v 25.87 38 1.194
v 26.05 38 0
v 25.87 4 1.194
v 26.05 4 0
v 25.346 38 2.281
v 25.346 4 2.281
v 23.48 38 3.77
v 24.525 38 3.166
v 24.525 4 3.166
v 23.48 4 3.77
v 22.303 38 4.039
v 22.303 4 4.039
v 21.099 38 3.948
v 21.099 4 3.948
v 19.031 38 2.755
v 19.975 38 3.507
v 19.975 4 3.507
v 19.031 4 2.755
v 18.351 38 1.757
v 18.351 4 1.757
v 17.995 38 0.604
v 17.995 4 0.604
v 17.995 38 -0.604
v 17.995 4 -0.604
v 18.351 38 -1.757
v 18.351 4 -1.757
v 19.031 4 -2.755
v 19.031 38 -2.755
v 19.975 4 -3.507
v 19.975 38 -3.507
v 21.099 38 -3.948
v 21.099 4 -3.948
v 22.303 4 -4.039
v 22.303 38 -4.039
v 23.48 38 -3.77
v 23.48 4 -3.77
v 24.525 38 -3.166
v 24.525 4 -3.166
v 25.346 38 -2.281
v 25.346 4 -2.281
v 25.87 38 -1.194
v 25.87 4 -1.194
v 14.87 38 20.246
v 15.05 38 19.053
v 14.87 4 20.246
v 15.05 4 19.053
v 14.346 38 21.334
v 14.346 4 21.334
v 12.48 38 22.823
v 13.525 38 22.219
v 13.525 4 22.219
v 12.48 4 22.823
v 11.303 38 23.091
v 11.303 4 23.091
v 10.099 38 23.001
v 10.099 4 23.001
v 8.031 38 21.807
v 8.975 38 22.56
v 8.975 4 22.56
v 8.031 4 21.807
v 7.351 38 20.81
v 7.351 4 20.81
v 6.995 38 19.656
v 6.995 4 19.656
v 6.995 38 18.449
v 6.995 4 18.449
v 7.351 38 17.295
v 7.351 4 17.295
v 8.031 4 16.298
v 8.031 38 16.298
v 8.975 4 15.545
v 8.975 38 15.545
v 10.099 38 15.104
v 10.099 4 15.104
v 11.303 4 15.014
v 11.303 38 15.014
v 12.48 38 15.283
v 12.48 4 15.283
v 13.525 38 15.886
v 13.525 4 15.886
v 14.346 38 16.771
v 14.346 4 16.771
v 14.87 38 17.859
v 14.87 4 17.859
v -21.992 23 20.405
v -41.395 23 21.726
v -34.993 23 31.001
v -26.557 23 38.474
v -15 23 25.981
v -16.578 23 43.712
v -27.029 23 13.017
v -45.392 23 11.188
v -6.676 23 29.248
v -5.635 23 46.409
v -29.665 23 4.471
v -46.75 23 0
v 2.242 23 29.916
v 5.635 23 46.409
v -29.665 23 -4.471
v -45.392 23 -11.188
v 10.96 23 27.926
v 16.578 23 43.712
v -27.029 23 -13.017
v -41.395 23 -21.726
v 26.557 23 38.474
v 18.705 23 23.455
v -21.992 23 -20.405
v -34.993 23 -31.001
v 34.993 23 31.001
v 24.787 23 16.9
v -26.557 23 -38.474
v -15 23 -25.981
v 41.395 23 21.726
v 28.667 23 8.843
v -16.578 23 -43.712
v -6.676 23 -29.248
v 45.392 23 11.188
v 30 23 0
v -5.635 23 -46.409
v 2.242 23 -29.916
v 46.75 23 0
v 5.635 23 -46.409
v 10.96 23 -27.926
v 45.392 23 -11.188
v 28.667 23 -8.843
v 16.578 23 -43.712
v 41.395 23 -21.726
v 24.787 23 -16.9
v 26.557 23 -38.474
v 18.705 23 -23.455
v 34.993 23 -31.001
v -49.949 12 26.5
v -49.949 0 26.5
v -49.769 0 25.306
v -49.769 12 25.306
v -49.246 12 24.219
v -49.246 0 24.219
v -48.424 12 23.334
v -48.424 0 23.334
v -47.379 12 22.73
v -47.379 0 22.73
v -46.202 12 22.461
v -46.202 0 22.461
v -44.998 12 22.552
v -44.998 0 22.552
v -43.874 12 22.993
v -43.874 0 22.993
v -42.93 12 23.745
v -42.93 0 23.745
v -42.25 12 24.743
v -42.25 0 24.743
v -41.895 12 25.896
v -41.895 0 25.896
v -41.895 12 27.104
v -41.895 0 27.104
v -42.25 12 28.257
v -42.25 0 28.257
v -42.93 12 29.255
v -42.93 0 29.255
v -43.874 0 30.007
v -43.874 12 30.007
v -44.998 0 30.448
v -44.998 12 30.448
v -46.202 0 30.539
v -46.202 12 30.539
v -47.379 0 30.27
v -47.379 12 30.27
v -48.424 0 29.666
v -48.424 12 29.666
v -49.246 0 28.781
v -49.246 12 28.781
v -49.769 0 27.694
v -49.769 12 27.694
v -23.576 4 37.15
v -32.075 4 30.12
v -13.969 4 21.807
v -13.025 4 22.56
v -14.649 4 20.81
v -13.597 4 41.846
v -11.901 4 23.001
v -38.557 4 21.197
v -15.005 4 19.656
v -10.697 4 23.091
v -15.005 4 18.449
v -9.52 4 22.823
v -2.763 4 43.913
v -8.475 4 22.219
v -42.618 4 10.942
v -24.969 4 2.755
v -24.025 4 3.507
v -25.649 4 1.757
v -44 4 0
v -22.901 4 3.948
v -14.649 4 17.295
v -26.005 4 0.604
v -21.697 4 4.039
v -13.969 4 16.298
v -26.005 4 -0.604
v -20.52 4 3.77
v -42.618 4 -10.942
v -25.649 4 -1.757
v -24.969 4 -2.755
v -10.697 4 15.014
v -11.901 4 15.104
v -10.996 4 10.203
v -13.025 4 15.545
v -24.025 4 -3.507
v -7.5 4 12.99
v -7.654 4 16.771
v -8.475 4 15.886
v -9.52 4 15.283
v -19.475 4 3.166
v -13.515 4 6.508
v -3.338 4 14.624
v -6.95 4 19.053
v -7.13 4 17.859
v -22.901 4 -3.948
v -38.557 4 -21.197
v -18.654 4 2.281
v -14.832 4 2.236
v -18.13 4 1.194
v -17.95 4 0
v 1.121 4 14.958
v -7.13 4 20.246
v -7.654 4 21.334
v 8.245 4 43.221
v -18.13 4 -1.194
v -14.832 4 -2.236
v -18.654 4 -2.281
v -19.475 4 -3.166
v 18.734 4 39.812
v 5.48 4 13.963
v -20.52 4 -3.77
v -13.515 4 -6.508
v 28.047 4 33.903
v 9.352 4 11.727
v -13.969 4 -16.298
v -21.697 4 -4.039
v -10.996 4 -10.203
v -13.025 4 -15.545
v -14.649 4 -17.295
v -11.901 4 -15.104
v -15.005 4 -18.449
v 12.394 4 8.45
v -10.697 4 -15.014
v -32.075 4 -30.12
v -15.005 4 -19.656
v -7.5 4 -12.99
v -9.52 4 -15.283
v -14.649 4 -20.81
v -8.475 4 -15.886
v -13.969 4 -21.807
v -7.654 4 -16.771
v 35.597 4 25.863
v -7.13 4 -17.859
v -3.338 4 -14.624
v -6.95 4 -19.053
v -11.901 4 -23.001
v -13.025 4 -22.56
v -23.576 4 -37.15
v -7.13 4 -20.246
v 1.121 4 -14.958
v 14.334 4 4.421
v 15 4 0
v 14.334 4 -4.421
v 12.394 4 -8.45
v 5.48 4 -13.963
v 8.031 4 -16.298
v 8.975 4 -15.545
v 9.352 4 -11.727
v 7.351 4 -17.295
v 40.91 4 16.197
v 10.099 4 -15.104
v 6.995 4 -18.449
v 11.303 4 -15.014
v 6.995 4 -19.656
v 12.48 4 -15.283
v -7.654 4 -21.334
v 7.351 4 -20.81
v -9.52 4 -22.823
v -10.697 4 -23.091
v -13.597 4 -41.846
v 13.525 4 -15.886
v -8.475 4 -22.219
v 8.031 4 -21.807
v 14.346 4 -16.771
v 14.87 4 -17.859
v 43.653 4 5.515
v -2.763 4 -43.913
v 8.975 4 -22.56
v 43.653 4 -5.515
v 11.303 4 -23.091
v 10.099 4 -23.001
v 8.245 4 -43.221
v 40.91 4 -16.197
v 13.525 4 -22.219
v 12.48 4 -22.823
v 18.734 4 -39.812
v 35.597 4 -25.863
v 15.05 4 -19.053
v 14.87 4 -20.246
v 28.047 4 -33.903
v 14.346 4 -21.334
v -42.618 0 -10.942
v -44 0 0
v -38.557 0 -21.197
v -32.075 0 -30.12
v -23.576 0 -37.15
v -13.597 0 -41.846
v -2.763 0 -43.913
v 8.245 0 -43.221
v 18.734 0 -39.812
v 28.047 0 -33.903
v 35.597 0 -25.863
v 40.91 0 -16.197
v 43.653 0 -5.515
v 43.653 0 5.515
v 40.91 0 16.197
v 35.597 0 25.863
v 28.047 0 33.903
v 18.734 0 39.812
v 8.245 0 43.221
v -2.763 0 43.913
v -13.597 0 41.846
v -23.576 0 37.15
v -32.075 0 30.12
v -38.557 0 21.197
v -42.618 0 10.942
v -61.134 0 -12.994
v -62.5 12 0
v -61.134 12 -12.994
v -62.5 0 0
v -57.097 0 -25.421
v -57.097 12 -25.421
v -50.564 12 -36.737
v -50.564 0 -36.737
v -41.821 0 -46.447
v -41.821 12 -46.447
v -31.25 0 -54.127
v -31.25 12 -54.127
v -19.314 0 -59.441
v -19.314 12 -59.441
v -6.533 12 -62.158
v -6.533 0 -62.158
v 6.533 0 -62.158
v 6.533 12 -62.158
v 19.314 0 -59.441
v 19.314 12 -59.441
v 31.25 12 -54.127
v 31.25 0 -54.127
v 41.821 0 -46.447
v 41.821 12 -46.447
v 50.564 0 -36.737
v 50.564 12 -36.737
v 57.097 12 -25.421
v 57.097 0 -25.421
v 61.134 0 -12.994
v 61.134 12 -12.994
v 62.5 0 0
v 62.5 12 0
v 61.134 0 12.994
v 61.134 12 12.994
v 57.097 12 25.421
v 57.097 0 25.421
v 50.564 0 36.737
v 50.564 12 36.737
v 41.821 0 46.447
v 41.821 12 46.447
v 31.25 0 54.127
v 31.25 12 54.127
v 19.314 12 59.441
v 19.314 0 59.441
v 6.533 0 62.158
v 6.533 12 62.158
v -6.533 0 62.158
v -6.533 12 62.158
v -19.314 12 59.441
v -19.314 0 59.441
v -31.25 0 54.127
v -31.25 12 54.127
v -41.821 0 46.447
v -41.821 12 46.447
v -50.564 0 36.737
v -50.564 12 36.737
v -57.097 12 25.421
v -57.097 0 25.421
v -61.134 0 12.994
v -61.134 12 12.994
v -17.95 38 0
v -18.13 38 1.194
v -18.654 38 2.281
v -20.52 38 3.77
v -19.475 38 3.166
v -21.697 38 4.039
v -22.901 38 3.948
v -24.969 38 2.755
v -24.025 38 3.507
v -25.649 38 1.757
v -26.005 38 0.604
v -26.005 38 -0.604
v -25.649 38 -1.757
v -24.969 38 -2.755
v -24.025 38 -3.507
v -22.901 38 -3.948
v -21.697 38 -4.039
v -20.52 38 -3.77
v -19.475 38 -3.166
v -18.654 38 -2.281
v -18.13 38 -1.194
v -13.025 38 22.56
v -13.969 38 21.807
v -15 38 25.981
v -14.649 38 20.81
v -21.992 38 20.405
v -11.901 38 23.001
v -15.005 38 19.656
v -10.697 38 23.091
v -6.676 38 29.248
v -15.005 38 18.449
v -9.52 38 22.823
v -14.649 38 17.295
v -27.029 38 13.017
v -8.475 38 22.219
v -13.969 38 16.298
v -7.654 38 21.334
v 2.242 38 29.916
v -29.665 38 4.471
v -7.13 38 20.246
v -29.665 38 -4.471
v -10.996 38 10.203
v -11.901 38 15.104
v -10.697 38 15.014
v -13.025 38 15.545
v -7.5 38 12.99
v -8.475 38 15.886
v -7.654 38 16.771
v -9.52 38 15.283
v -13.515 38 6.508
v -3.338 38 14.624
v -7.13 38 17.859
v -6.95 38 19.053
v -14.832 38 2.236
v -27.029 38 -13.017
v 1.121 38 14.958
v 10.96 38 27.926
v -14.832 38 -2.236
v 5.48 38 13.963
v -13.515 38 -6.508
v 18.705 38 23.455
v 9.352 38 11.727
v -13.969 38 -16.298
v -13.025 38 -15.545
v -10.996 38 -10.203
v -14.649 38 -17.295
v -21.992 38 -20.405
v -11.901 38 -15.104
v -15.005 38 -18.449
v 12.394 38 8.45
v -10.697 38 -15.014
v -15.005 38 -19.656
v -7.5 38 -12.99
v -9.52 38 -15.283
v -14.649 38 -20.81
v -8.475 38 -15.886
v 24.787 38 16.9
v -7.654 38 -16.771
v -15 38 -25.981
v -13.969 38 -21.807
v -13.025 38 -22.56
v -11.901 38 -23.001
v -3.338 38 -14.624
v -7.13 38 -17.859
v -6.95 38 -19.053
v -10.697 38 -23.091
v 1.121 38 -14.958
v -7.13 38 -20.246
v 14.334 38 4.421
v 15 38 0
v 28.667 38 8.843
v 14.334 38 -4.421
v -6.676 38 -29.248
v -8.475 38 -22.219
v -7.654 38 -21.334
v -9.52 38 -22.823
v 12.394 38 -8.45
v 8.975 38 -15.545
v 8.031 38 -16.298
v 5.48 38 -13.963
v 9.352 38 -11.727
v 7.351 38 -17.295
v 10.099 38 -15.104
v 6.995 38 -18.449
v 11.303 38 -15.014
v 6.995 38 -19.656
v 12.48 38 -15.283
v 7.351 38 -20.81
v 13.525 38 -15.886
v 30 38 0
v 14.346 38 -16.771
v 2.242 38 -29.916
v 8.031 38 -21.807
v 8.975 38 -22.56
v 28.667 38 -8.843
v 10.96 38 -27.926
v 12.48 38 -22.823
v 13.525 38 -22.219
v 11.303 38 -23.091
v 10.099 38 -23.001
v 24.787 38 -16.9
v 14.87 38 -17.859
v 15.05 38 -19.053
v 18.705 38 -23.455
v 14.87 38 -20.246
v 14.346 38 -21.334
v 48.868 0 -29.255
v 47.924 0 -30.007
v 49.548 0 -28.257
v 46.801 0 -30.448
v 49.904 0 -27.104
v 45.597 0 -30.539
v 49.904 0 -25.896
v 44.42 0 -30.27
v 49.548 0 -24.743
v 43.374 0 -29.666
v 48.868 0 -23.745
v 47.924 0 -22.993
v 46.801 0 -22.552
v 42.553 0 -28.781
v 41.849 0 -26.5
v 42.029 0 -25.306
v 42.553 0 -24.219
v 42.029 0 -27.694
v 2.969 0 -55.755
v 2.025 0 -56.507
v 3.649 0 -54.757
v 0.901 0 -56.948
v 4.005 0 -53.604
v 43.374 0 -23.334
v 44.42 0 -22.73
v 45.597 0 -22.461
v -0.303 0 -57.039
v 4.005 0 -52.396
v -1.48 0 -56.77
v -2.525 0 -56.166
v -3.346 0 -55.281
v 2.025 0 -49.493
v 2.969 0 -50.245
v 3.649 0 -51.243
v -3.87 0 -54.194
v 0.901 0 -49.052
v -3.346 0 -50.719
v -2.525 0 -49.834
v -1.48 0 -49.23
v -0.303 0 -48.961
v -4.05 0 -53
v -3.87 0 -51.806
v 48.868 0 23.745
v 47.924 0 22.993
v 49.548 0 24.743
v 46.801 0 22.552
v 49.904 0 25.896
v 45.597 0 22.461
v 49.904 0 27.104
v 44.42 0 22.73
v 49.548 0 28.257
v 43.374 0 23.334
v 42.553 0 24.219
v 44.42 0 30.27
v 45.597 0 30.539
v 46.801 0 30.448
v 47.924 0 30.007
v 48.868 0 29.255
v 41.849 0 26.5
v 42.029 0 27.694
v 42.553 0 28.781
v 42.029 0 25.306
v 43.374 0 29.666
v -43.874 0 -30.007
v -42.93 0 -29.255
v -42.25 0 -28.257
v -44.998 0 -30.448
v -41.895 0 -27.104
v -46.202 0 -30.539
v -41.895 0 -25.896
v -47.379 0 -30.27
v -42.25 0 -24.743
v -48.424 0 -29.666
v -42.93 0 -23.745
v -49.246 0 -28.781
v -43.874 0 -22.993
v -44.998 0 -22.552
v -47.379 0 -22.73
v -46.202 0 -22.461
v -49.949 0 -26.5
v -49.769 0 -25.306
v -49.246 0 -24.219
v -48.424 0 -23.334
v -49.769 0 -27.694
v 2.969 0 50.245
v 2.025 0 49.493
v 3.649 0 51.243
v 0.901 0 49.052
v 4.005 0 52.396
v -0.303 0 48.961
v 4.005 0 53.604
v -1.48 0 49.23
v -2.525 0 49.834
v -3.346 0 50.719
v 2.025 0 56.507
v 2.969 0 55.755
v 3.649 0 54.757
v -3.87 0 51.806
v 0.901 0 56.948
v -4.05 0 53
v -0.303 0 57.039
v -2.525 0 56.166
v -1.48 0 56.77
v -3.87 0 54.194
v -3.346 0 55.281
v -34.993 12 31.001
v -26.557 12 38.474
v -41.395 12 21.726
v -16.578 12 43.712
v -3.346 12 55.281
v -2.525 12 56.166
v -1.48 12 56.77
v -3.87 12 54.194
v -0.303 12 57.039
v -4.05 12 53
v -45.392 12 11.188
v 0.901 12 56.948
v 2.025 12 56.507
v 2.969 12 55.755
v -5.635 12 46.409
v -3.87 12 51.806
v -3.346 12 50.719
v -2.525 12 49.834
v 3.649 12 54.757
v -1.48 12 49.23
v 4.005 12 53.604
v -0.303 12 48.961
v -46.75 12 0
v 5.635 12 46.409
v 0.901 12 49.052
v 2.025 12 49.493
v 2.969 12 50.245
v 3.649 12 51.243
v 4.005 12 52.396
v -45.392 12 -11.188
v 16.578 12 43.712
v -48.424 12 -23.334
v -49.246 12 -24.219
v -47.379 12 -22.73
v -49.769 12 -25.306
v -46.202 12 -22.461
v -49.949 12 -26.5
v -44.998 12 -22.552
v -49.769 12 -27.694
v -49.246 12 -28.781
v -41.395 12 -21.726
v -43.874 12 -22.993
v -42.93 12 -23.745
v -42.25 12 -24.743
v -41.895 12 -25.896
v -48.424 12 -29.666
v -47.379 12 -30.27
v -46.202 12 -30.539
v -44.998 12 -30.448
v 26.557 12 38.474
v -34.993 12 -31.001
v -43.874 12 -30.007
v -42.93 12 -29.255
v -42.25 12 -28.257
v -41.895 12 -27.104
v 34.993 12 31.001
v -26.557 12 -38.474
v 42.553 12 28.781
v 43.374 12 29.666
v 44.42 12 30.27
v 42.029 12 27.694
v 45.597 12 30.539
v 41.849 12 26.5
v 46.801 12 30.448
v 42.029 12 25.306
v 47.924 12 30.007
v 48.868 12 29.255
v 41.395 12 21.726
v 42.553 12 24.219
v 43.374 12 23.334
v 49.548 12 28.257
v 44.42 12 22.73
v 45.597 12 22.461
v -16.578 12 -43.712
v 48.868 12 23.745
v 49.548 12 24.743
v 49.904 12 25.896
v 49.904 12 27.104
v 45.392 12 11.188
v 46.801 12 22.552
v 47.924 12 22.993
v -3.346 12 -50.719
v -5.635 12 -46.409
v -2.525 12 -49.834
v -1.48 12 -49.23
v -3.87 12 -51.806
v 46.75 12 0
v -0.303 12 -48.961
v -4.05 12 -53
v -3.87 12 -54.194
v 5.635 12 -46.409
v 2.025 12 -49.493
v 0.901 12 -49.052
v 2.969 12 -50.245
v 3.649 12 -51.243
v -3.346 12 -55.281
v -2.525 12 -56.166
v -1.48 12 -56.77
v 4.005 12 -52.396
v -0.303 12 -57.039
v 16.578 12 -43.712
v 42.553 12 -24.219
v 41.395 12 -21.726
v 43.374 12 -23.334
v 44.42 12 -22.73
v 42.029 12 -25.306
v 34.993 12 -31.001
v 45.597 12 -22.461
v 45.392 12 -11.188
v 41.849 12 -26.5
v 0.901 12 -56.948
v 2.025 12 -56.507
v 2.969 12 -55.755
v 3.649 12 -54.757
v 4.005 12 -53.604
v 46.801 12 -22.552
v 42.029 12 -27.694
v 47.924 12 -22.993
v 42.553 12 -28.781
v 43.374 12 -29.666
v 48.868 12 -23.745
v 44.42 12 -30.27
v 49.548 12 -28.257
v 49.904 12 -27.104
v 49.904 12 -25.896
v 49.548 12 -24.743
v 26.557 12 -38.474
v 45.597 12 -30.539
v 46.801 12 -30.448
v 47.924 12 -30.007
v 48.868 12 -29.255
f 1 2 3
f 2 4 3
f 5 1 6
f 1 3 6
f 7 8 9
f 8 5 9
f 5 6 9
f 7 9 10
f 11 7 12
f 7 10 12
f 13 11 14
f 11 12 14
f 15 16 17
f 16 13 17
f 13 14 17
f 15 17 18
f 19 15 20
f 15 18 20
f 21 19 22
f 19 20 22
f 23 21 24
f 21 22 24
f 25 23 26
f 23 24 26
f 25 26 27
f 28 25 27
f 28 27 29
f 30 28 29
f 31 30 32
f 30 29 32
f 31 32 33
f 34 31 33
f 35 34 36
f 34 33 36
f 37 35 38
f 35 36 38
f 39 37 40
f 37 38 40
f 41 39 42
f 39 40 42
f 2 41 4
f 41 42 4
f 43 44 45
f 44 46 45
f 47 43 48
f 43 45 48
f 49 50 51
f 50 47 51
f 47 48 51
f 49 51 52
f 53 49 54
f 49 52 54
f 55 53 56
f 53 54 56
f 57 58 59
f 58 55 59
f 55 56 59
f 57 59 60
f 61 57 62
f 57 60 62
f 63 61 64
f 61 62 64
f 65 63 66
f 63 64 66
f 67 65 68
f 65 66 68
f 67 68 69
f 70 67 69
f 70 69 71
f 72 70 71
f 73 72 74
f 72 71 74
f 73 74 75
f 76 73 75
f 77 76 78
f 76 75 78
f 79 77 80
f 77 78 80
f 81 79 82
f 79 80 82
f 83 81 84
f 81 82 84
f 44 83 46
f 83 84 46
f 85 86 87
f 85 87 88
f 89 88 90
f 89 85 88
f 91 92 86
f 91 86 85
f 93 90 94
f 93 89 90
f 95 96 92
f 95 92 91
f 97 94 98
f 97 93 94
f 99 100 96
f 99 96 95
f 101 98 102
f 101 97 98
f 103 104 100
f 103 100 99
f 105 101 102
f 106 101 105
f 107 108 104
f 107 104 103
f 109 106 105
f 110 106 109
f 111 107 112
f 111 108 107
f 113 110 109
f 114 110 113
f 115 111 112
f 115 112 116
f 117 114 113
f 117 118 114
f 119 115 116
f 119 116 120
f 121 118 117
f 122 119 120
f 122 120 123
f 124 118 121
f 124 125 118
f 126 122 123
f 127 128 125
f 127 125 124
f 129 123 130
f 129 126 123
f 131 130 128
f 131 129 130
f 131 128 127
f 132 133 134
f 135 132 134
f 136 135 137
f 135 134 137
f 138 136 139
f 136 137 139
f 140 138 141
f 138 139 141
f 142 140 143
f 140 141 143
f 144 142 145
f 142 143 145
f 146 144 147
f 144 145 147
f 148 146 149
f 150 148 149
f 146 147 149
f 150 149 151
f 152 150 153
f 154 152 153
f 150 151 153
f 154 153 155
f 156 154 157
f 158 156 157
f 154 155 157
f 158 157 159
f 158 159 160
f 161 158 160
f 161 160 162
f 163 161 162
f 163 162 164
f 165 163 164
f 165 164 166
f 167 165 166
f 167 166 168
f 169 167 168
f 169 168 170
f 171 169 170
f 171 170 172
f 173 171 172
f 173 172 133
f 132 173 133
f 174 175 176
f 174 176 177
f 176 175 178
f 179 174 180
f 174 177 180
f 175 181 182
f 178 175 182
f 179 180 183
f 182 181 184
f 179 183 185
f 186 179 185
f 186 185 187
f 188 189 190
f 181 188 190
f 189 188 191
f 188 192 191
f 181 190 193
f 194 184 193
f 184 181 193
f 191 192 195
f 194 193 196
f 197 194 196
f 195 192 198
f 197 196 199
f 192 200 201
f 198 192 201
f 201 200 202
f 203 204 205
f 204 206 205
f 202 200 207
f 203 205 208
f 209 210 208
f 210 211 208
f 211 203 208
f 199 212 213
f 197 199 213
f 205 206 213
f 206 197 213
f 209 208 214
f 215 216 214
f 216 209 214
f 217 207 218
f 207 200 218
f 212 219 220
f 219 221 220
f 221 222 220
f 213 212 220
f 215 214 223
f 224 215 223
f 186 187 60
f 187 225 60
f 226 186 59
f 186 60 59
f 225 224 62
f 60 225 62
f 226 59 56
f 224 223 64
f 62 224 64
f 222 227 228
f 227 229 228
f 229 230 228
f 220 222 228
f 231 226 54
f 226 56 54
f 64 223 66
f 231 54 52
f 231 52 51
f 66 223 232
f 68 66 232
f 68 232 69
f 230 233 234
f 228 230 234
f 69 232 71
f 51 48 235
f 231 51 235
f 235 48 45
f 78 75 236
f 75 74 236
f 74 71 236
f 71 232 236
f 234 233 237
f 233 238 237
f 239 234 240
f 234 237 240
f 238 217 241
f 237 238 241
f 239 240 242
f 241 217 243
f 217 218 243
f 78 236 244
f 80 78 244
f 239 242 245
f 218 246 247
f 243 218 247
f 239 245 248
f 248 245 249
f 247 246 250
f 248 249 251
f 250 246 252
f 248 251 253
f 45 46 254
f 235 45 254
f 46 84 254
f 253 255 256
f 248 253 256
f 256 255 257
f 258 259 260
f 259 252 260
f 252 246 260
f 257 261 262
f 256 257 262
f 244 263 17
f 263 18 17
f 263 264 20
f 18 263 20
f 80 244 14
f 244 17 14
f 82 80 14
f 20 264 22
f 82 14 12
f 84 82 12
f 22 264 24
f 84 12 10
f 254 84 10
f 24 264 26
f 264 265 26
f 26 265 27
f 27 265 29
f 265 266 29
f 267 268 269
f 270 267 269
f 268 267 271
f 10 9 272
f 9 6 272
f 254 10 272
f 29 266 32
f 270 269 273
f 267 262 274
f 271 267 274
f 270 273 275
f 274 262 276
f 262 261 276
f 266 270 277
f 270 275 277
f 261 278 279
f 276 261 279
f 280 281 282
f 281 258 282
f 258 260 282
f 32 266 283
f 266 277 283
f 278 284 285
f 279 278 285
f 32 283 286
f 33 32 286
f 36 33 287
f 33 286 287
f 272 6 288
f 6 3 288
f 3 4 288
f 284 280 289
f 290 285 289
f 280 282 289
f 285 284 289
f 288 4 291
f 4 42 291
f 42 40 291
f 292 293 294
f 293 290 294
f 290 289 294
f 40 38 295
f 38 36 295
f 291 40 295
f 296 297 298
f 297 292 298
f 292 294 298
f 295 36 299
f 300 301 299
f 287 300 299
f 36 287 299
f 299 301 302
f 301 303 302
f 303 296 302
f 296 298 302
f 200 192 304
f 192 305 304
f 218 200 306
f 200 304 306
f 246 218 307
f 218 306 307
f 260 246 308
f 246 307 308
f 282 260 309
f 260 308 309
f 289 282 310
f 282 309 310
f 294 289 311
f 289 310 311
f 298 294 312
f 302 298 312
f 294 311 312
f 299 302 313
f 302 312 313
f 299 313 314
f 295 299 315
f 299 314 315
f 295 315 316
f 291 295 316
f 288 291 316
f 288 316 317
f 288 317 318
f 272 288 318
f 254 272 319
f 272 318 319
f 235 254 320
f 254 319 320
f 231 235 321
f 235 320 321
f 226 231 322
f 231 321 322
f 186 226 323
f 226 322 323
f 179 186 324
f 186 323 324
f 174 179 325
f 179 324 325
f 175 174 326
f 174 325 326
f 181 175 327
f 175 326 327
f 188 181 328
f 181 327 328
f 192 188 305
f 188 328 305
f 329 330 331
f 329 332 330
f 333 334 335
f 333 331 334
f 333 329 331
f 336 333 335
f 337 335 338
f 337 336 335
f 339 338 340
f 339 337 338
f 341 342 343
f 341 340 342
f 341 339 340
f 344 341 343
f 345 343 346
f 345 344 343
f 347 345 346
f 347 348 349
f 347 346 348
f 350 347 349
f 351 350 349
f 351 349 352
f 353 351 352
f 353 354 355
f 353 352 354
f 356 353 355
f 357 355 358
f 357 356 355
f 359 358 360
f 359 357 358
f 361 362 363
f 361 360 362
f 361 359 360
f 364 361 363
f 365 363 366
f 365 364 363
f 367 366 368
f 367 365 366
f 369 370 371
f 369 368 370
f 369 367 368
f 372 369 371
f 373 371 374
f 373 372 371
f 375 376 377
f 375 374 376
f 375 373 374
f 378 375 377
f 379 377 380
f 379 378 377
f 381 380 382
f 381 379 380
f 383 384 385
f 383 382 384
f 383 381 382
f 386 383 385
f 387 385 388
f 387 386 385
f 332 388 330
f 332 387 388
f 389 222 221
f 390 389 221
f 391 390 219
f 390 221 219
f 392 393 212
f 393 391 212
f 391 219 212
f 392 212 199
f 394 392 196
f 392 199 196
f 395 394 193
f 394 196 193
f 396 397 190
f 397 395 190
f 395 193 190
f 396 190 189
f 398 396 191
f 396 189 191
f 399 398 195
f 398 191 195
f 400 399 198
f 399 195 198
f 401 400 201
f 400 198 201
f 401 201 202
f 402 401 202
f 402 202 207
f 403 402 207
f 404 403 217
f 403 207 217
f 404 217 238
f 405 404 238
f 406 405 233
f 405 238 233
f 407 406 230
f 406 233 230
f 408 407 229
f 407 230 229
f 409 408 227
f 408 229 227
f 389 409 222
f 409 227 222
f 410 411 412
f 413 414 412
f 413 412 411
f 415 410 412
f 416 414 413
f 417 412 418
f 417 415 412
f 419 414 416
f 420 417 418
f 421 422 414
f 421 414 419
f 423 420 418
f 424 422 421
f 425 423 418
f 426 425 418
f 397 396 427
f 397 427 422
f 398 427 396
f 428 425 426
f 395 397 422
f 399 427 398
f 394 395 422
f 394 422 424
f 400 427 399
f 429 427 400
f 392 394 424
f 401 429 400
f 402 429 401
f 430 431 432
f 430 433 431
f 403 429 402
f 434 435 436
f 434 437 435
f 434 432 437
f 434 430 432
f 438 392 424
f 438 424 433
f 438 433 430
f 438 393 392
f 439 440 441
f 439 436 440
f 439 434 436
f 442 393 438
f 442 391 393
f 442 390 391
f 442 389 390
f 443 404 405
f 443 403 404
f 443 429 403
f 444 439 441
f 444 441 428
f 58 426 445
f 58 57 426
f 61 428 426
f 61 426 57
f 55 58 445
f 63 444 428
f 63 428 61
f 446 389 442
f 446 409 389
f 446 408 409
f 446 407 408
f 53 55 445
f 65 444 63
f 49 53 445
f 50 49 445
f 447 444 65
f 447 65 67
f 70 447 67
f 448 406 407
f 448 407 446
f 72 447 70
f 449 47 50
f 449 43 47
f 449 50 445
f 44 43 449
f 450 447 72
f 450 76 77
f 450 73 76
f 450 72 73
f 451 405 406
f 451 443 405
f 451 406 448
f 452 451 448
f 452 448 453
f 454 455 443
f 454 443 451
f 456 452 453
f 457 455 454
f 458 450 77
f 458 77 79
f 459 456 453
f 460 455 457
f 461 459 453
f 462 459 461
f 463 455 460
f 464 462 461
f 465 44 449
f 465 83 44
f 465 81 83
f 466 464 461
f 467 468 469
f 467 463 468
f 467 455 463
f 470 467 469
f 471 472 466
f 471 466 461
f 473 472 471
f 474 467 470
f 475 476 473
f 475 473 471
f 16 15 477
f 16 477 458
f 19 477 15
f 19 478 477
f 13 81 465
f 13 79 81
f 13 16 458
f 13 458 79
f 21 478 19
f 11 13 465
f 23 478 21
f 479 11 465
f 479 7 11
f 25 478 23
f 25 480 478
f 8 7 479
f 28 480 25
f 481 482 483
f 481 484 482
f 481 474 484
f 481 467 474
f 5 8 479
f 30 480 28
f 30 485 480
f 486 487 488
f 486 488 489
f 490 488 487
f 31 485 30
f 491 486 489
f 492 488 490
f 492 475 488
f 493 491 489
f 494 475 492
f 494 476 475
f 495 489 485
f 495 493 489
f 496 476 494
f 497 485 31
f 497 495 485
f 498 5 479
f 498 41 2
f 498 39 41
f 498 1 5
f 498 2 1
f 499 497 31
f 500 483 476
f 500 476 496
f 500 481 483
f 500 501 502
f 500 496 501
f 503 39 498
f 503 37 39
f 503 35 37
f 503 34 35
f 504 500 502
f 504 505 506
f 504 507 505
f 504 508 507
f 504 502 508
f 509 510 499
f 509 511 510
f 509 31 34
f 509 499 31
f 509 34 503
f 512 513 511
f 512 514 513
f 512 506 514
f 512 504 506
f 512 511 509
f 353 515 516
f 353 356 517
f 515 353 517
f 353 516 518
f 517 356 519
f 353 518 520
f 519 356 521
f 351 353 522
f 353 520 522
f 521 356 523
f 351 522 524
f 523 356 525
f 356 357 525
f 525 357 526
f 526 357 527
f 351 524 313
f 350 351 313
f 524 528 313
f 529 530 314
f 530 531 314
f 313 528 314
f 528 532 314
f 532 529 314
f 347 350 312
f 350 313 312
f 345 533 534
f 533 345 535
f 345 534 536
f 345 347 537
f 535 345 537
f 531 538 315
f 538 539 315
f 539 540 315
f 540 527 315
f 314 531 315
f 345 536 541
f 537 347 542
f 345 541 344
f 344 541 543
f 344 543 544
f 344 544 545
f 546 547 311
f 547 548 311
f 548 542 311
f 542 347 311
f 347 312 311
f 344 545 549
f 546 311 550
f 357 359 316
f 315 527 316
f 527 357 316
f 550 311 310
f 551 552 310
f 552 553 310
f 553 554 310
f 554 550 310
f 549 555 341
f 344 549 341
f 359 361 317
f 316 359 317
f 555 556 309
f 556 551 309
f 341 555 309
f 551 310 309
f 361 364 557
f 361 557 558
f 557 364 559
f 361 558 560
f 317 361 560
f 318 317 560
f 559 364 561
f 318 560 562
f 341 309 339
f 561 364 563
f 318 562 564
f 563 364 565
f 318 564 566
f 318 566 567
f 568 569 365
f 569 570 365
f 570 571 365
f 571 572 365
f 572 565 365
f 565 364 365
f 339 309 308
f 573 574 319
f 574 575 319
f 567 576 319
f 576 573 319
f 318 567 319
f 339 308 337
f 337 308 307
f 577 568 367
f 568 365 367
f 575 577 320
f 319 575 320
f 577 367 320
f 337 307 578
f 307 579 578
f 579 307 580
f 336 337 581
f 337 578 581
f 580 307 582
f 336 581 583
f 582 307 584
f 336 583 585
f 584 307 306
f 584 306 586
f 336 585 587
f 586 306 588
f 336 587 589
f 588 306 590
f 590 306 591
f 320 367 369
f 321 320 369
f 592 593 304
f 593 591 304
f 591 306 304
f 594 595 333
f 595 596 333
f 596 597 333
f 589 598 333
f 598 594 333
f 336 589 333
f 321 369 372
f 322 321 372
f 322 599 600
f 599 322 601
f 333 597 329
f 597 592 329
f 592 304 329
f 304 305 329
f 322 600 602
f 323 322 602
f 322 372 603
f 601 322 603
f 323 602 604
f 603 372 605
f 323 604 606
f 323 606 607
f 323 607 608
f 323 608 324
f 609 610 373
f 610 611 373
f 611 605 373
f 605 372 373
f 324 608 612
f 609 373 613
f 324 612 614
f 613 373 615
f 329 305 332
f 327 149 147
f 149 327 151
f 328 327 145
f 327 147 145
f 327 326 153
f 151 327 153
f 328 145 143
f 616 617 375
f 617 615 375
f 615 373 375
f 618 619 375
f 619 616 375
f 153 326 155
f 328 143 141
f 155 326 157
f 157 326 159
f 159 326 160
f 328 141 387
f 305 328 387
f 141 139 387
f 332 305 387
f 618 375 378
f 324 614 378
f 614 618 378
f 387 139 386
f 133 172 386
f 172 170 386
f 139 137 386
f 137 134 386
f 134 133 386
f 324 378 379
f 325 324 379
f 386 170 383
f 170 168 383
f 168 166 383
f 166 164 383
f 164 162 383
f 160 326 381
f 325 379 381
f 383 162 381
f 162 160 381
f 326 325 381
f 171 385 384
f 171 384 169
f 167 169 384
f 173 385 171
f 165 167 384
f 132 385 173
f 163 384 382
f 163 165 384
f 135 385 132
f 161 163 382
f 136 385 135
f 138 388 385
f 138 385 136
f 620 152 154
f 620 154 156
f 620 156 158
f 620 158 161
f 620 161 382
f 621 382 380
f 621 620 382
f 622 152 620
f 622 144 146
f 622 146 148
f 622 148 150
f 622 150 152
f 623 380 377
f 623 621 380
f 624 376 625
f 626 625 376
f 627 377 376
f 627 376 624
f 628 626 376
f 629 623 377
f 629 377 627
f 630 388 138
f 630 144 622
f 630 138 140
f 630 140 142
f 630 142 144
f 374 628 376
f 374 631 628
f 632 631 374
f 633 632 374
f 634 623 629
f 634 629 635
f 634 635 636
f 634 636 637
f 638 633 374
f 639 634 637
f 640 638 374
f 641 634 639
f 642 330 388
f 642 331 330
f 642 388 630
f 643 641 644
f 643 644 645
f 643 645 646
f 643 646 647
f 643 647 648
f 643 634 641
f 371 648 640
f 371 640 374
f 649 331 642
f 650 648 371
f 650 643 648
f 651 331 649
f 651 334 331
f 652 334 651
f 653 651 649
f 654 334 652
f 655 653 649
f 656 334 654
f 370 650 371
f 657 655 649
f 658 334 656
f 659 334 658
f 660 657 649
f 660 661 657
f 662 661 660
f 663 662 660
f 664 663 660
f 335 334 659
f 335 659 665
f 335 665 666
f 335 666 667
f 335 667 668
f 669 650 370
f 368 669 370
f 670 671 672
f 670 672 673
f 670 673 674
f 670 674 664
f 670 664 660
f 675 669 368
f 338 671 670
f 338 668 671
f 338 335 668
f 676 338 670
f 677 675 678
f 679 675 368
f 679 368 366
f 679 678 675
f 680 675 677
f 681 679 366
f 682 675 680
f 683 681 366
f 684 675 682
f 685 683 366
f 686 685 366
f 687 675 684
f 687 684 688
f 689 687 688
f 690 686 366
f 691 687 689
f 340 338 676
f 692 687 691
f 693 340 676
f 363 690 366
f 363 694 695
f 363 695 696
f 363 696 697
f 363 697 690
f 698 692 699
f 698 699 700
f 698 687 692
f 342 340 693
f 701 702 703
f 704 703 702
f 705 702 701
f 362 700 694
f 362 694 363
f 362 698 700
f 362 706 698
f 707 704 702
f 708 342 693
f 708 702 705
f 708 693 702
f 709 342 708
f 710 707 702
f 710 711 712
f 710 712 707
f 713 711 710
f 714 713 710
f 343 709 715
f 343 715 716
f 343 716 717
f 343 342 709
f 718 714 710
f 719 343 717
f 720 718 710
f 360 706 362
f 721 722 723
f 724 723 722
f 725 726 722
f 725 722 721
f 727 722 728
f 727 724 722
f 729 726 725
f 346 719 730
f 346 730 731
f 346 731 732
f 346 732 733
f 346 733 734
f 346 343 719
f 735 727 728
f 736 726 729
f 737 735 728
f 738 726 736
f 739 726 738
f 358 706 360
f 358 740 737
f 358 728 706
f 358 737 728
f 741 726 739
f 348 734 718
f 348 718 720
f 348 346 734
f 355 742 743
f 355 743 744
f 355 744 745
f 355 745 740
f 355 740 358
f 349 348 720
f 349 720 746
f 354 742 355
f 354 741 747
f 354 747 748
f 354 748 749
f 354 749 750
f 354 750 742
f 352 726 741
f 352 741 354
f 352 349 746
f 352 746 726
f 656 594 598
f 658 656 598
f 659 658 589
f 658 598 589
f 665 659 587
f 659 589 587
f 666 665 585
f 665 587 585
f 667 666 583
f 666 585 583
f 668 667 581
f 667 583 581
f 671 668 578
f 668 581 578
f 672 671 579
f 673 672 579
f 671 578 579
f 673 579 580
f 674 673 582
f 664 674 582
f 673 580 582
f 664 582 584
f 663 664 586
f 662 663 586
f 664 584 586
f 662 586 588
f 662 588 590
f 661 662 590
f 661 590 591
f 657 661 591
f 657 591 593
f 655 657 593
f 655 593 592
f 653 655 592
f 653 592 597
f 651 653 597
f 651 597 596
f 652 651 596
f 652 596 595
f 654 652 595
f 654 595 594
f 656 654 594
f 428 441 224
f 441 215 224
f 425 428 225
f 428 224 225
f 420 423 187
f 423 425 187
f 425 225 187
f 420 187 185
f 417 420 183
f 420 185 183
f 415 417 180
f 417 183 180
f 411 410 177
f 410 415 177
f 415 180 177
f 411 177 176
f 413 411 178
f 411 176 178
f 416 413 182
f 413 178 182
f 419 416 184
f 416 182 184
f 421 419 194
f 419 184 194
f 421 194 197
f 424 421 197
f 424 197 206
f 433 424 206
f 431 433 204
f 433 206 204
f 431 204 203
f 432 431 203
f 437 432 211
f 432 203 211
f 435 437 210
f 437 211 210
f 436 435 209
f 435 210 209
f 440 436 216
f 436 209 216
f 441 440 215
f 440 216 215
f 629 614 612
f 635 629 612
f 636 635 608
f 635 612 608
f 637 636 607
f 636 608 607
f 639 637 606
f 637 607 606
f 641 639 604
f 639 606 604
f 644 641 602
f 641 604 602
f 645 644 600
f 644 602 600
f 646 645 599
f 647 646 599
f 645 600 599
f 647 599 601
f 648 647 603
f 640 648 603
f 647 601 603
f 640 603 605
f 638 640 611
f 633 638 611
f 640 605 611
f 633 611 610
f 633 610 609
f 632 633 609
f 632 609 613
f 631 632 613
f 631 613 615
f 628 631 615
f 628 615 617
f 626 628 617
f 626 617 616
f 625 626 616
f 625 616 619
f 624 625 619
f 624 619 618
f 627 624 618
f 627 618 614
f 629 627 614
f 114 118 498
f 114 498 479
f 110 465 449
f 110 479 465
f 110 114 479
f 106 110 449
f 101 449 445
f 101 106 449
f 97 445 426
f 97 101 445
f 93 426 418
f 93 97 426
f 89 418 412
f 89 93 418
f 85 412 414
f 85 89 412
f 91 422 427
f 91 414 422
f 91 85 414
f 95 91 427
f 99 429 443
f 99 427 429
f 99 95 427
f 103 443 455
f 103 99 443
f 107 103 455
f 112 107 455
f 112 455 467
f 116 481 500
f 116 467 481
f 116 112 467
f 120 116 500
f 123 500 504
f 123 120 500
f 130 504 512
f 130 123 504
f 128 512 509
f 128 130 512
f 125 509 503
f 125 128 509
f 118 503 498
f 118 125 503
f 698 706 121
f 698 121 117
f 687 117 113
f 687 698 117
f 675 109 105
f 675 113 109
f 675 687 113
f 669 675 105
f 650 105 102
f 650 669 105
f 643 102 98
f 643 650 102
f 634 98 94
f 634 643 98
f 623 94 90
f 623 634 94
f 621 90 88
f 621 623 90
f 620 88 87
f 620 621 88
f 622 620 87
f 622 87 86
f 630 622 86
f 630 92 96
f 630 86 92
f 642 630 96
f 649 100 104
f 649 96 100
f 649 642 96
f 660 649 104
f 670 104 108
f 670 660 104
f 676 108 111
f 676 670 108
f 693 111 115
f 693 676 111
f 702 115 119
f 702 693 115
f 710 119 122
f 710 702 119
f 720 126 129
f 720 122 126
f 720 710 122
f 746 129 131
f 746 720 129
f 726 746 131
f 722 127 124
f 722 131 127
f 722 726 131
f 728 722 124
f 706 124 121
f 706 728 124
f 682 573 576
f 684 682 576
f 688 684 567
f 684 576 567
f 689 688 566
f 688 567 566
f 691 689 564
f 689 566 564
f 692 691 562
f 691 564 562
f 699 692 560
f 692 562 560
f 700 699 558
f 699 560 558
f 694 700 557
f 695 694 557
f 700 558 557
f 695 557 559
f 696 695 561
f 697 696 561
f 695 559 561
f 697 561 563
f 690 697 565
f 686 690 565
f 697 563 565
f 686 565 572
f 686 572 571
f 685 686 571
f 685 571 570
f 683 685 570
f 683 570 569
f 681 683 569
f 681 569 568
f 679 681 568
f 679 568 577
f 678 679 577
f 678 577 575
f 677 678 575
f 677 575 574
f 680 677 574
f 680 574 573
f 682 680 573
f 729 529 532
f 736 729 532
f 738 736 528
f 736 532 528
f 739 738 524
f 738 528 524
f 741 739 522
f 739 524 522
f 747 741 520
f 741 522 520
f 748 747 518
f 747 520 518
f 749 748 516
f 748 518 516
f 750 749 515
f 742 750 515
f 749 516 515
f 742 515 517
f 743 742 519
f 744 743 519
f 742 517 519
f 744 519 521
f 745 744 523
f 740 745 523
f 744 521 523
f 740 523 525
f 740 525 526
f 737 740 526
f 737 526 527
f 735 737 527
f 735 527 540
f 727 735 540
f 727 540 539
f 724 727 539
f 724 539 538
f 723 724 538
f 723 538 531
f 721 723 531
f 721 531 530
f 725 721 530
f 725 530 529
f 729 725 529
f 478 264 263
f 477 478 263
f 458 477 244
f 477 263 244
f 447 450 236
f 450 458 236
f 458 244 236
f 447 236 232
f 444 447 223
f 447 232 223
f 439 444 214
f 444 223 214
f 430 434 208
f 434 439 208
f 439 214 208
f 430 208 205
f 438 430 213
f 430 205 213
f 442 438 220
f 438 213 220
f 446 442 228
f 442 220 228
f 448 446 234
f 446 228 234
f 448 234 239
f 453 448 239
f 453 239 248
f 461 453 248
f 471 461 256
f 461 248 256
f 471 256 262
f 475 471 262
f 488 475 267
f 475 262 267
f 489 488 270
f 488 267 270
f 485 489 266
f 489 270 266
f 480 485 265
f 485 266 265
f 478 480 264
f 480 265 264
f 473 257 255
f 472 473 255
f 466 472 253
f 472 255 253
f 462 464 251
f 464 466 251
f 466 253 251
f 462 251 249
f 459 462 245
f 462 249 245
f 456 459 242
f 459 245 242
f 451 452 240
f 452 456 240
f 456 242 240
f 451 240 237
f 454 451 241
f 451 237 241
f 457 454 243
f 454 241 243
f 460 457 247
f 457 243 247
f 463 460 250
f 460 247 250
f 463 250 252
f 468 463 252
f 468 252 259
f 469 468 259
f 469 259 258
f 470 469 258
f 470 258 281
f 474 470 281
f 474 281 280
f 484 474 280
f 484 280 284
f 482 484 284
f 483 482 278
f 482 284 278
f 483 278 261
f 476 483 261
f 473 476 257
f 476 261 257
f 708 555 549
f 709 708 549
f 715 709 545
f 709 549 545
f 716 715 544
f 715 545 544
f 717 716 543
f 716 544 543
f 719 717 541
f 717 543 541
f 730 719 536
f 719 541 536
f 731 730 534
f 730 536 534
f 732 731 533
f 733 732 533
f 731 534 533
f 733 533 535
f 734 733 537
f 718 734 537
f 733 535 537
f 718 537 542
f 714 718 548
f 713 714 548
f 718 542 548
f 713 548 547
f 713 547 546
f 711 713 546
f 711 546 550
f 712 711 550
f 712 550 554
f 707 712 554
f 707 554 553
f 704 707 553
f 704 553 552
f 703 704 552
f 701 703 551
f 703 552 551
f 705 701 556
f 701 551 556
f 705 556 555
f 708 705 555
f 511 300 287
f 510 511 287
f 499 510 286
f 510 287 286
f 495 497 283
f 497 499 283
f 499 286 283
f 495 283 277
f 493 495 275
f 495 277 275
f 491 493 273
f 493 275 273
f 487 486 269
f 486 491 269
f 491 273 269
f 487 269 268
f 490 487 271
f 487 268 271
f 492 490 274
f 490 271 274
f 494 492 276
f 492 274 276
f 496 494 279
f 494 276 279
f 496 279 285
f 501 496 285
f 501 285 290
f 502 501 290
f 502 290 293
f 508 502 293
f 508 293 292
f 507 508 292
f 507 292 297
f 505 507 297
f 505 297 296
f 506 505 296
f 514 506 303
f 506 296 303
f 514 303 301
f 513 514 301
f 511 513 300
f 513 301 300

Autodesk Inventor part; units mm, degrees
ref_plane "YZ Plane" through (0, 0, 0) normal (1, 0, 0) x (0, 1, 0)
ref_plane "XZ Plane" through (0, 0, 0) normal (0, 1, 0) x (-1, 0, 0)
ref_plane "XY Plane" through (0, 0, 0) normal (0, 0, 1) x (1, 0, 0)
sketch "Sketch1" plane through (0, 0, 0) normal (0, 1, 0) x (-1, 0, 0)
  circle A0 centre (0, 0) radius 62.5
  circle A1 centre (0, 0) radius 53
  circle A2 centre (0, -53) radius 4.05
  circle A3 centre (0, 0) radius 44
  circle A4 centre (45.8993, -26.5) radius 4.05
  circle A5 centre (45.8993, 26.5) radius 4.05
  circle A6 centre (0, 53) radius 4.05
  circle A7 centre (-45.8993, 26.5) radius 4.05
  circle A8 centre (-45.8993, -26.5) radius 4.05
  dimension "d1" = 106
  dimension "d0" = 125
  dimension "d4" = 360
  dimension "d18" = 8.1
extrude "Extrusion1" add sketch "Sketch1" along normal blind 12 contours A0 | A1 A4 A2 A8 A7 A6 A5
sketch "Sketch2" plane through (0, 12, 0) normal (0, 1, 0) x (1, 0, 0)
  circle A0 centre (0, 0) radius 44 projected
  circle A1 centre (0, 0) radius 15
  circle A2 centre (-22, 0) radius 4.05
  circle A3 centre (-11, -19.0526) radius 4.05
  circle A4 centre (11, -19.0526) radius 4.05
  circle A5 centre (22, 0) radius 4.05
  circle A6 centre (11, 19.0526) radius 4.05
  circle A7 centre (-11, 19.0526) radius 4.05
  dimension "d8" = 30
  dimension "d11" = 22
  dimension "d12" = 8.1
  dimension "d15" = 360
extrude "Extrusion2" add sketch "Sketch2" against normal blind 8
sketch "Sketch3" plane through (0, 12, 0) normal (0, 1, 0) x (1, 0, 0)
  circle A0 centre (0, 0) radius 30
  circle A1 centre (0, 0) radius 15 projected
  circle A2 centre (-22, 0) radius 4.05 projected
  circle A3 centre (-11, -19.0526) radius 4.05 projected
  circle A4 centre (11, -19.0526) radius 4.05 projected
  circle A5 centre (22, 0) radius 4.05 projected
  circle A6 centre (11, 19.0526) radius 4.05 projected
  circle A7 centre (-11, 19.0526) radius 4.05 projected
  circle A8 centre (0, 0) radius 62.5 projected
  circle A9 centre (0, 53) radius 4.05 projected
  circle A10 centre (-45.8993, 26.5) radius 4.05 projected
  circle A11 centre (-45.8993, -26.5) radius 4.05 projected
  circle A12 centre (0, -53) radius 4.05 projected
  circle A13 centre (45.8993, -26.5) radius 4.05 projected
  circle A14 centre (45.8993, 26.5) radius 4.05 projected
  dimension "d17" = 60
extrude "Extrusion3" add sketch "Sketch3" along normal blind 24 contours A0
sketch "Sketch4" plane through (0, 12, 0) normal (0, 1, 0) x (1, 0, 0)
  circle A0 centre (0, 0) radius 46.75
  circle A1 centre (0, 0) radius 44 projected
  circle A2 centre (0, 0) radius 30 projected
  circle A3 centre (0, 0) radius 62.5 projected
  circle A4 centre (0, 53) radius 4.05 projected
  circle A5 centre (-45.8993, 26.5) radius 4.05 projected
  circle A6 centre (-45.8993, -26.5) radius 4.05 projected
  circle A7 centre (0, -53) radius 4.05 projected
  circle A8 centre (45.8993, -26.5) radius 4.05 projected
  circle A9 centre (45.8993, 26.5) radius 4.05 projected
  dimension "d24" = 93.5
extrude "Extrusion4" add sketch "Sketch4" along normal blind 11 contours A0 | A1
sketch "Sketch5" plane through (0, 36, 0) normal (0, 1, 0) x (1, 0, 0)
  circle A0 centre (0, 0) radius 30 projected
  circle A1 centre (-11, 19.0526) radius 4.05 projected
  circle A2 centre (11, 19.0526) radius 4.05 projected
  circle A3 centre (22, 0) radius 4.05 projected
  circle A4 centre (11, -19.0526) radius 4.05 projected
  circle A5 centre (-11, -19.0526) radius 4.05 projected
  circle A6 centre (-22, 0) radius 4.05 projected
  circle A7 centre (0, 0) radius 15 projected
extrude "Extrusion5" add sketch "Sketch5" along normal blind 2
properties part number "OnPatronFlanech"
